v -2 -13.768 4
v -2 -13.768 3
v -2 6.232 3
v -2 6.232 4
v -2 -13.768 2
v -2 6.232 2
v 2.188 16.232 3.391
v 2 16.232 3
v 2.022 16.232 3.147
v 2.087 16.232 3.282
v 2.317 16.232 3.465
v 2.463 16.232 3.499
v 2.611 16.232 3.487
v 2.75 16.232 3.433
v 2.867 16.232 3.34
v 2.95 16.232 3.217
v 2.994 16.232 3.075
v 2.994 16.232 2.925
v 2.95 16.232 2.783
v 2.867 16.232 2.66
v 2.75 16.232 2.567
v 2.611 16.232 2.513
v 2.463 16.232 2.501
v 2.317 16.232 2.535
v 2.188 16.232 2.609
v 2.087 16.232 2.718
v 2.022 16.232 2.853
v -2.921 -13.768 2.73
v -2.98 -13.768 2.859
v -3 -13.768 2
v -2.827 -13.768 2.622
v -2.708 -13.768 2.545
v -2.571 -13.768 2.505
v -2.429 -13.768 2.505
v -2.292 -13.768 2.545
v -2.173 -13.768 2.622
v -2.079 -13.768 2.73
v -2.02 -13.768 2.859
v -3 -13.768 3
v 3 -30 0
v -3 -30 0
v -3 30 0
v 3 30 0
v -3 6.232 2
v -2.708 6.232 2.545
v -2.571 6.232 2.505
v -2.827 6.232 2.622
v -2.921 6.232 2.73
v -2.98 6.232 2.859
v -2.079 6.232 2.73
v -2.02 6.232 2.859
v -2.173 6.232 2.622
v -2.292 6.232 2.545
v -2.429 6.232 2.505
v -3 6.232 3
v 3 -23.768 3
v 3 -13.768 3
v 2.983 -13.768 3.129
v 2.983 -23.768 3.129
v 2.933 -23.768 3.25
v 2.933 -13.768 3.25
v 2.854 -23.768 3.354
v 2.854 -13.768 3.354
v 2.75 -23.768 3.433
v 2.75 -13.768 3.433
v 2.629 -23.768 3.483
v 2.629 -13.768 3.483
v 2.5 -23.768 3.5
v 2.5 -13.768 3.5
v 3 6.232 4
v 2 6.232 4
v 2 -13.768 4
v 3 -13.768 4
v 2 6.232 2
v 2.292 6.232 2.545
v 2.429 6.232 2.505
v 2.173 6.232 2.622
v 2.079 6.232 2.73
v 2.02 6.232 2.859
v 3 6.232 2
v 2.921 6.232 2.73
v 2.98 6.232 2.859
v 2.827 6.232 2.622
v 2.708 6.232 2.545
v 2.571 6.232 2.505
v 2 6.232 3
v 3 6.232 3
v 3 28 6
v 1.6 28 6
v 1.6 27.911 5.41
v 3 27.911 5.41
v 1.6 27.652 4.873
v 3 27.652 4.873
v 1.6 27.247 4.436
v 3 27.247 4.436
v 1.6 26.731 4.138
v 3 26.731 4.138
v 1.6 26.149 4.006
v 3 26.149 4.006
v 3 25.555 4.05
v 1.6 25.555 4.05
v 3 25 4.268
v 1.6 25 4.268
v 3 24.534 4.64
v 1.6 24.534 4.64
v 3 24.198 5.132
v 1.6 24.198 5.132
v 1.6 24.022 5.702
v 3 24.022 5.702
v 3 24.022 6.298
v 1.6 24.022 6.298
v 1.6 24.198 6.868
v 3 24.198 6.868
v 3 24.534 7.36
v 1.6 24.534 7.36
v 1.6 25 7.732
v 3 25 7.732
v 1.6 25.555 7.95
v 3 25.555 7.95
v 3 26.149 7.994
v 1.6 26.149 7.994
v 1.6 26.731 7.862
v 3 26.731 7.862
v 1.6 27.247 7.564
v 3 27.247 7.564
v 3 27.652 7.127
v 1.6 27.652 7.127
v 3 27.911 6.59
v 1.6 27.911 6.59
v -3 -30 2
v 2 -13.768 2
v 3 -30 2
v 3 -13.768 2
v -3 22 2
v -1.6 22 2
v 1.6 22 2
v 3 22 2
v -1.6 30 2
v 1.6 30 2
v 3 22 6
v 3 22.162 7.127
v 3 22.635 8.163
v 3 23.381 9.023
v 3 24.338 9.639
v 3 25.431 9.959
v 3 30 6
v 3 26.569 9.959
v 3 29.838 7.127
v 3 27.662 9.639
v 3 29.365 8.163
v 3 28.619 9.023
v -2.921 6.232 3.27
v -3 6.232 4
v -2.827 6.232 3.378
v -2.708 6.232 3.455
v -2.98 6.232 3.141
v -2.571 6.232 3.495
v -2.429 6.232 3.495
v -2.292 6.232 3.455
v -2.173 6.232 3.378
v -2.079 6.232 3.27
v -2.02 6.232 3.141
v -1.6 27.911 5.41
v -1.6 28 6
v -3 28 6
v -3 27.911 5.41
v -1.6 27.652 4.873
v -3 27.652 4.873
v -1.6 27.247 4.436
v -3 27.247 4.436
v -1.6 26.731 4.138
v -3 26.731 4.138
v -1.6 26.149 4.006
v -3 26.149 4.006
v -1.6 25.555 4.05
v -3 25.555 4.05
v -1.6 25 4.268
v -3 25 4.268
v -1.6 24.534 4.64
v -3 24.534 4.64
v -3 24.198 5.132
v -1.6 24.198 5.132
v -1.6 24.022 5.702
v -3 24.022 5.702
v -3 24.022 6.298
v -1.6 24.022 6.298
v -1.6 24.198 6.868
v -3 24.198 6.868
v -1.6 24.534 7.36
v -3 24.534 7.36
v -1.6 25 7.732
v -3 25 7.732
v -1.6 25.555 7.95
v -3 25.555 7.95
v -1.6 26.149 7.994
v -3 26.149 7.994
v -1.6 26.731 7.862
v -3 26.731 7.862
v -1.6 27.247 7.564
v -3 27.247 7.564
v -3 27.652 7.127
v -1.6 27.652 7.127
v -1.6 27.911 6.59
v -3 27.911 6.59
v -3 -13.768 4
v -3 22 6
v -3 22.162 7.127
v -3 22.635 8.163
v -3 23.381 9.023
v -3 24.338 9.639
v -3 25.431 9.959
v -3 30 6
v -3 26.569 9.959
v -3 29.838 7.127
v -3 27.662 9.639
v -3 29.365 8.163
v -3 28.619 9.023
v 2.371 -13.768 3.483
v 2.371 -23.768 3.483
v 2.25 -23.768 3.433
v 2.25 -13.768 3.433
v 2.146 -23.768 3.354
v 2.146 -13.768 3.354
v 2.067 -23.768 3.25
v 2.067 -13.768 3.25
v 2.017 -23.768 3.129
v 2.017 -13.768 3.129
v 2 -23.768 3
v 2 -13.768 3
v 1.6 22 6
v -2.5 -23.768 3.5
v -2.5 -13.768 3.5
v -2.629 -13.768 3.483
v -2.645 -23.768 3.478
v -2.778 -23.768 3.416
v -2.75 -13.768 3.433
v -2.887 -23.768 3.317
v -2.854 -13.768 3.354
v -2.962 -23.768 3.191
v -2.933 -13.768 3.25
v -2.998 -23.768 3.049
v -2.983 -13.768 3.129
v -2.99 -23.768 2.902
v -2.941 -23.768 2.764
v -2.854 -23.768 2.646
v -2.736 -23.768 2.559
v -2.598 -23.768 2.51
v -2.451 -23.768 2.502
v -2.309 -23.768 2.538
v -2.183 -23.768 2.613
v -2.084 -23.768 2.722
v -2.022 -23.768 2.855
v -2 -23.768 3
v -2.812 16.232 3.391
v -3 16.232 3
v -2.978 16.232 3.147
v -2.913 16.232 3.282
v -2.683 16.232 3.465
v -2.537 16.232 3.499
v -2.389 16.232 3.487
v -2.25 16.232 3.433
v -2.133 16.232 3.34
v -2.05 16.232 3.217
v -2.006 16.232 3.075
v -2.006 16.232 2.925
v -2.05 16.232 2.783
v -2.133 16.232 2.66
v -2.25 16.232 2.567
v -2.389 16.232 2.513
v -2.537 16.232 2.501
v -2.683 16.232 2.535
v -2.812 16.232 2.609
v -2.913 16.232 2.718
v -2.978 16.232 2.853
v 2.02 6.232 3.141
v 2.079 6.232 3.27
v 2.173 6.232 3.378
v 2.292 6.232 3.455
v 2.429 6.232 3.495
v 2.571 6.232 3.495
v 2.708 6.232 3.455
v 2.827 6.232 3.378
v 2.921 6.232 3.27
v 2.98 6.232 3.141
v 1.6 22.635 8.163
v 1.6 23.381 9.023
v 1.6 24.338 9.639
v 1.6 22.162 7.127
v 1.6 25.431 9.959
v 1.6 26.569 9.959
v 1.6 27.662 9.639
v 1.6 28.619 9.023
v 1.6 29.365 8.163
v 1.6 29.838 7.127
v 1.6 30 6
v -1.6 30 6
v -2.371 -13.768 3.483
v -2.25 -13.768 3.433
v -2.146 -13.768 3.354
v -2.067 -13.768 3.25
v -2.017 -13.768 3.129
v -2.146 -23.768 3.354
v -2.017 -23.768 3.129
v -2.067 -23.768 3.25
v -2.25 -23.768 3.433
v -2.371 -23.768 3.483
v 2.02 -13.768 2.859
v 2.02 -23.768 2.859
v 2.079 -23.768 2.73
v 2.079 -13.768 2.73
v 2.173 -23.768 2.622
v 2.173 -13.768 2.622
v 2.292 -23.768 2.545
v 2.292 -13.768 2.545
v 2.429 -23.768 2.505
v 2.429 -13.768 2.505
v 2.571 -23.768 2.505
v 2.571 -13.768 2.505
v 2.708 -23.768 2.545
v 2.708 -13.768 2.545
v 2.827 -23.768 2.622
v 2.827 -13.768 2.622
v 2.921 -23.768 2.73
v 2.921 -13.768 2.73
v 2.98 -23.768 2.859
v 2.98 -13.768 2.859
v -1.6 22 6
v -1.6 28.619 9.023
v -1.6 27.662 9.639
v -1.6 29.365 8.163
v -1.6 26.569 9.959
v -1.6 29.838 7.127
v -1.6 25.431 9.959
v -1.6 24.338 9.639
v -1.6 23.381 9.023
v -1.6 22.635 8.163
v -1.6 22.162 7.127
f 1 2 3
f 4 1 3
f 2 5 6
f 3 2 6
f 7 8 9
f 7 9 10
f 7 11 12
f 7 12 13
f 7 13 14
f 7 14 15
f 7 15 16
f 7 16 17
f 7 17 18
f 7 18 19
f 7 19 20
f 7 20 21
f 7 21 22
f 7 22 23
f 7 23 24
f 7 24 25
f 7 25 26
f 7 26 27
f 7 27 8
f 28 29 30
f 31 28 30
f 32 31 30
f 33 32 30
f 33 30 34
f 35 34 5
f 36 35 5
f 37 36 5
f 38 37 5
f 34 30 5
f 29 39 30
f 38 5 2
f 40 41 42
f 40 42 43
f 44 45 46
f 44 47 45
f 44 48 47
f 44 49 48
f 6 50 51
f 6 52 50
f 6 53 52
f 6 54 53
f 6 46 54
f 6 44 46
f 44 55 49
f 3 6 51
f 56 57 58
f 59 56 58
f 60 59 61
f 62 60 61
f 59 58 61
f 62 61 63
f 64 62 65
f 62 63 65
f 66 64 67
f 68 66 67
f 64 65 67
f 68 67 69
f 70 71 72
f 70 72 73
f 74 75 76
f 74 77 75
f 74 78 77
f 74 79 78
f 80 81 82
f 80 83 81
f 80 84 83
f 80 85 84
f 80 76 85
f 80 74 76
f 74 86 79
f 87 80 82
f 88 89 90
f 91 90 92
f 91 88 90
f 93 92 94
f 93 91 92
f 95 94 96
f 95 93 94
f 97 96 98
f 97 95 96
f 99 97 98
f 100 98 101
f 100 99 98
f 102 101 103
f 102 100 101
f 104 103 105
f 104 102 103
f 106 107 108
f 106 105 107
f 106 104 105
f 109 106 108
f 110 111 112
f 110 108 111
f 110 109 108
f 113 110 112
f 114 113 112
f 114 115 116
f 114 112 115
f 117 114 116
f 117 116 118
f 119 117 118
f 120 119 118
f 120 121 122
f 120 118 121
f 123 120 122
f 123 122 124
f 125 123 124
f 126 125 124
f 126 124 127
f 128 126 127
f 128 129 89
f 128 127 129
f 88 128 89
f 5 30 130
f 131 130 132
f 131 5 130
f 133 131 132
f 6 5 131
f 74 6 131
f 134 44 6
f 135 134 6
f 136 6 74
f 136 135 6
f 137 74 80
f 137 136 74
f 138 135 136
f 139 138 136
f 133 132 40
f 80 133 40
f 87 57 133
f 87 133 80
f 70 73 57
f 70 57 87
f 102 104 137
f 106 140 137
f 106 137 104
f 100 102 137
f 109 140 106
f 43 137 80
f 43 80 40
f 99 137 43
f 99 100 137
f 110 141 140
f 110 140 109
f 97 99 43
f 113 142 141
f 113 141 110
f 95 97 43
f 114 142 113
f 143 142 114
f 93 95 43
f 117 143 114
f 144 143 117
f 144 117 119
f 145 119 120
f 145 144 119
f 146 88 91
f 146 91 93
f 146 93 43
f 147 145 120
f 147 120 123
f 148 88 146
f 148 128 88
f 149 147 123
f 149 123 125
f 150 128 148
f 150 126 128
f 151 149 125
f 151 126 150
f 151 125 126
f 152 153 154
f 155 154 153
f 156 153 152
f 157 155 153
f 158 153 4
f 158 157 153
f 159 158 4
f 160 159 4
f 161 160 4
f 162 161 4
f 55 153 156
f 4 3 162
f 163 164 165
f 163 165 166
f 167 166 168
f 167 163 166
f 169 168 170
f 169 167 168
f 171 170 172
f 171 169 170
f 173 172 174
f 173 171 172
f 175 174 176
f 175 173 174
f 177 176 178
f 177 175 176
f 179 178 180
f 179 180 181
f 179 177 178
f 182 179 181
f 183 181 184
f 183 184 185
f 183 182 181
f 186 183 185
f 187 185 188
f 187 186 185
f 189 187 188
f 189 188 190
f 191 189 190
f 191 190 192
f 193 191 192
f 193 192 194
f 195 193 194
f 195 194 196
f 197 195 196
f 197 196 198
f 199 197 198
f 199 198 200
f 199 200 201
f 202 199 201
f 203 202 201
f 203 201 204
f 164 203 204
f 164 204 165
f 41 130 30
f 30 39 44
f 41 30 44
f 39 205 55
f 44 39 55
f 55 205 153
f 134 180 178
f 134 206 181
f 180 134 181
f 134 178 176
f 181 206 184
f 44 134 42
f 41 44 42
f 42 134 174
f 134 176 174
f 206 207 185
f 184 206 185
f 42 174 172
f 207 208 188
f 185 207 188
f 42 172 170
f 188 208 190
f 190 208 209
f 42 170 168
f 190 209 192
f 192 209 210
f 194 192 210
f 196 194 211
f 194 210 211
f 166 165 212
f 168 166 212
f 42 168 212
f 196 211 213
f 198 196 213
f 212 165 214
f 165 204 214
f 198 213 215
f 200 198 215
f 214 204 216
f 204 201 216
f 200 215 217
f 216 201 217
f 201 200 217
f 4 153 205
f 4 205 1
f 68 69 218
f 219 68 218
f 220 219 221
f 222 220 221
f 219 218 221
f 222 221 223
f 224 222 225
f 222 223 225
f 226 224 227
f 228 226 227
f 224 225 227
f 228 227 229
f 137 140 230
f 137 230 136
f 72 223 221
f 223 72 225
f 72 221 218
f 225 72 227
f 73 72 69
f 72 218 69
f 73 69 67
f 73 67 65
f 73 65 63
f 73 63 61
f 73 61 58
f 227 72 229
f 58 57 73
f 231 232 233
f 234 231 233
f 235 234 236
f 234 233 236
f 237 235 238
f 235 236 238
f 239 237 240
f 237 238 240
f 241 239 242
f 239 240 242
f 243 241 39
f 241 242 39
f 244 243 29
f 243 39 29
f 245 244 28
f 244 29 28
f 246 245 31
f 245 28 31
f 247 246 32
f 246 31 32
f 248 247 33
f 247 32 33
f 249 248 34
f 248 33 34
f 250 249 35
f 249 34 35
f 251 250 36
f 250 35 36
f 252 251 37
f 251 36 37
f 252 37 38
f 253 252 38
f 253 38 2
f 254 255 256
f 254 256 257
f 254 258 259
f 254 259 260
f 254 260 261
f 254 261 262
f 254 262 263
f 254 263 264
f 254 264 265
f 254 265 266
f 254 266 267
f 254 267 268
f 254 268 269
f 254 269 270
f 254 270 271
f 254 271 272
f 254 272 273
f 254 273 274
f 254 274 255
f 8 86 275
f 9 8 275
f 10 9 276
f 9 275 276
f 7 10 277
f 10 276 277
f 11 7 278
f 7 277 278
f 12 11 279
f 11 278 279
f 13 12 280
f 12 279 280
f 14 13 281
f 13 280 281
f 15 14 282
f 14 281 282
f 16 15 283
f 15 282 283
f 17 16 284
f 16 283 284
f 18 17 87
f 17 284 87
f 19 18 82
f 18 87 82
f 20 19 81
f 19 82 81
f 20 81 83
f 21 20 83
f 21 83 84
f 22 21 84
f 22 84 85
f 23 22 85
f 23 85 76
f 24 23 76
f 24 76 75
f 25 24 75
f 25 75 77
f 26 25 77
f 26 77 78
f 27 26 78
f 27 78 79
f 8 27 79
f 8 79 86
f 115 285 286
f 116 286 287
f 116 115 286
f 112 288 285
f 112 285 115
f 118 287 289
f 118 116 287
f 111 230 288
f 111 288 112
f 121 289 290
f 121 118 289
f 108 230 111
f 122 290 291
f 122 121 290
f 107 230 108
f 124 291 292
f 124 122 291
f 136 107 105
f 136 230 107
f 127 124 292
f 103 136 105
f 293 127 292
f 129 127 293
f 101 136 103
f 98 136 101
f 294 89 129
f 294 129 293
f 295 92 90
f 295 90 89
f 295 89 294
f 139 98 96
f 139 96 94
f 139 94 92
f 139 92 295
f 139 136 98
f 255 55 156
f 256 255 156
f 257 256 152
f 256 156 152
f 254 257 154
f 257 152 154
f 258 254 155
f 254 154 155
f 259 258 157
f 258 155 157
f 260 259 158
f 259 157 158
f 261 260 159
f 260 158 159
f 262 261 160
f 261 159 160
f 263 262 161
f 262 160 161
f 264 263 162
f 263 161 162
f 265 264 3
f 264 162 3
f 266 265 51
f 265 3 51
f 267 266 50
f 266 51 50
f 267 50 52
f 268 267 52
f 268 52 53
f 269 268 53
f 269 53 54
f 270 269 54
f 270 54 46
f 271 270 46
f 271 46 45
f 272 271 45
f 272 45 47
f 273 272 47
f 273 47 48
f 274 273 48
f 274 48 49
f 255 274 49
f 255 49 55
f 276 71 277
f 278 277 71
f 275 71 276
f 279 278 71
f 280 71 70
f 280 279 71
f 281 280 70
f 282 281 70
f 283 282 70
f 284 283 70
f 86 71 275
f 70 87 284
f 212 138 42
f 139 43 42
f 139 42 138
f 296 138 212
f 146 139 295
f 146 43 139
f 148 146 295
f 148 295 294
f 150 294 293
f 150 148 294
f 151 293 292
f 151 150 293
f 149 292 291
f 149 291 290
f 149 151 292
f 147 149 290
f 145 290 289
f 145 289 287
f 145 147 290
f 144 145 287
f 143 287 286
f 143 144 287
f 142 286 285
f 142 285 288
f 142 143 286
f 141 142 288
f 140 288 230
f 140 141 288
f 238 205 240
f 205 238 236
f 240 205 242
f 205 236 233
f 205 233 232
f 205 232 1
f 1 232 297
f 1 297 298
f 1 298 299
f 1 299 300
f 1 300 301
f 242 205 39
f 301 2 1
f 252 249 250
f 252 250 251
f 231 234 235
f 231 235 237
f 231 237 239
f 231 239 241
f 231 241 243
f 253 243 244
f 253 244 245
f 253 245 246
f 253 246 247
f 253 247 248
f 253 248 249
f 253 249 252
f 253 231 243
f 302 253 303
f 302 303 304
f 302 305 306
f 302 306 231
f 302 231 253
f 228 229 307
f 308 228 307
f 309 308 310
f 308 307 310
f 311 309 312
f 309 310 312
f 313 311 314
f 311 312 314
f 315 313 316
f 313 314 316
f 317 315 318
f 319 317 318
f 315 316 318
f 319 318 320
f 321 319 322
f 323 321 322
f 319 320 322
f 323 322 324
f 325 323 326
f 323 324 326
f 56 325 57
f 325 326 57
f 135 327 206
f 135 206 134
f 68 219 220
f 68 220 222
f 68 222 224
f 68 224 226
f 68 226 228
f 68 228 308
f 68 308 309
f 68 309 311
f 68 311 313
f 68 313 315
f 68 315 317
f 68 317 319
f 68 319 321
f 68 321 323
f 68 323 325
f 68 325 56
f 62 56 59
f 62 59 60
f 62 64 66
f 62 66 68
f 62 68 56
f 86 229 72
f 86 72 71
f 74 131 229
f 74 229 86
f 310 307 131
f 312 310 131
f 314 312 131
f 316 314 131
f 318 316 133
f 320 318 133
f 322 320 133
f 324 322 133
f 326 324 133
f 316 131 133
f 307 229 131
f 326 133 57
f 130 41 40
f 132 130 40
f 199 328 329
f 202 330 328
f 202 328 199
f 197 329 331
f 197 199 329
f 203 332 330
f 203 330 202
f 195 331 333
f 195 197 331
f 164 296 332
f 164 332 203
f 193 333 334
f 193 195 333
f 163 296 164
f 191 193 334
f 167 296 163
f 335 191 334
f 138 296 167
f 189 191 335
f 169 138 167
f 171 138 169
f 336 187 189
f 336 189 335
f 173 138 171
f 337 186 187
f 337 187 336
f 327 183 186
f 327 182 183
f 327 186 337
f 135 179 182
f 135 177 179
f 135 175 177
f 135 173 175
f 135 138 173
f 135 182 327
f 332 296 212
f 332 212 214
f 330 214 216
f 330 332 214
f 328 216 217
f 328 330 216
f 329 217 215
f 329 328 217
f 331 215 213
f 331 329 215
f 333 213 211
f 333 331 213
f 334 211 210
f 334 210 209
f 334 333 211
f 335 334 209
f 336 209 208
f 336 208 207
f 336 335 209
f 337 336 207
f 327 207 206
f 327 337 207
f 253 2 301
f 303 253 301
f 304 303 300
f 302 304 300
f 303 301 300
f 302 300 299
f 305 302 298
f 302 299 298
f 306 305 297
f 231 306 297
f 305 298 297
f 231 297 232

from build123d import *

# Parameters (mm, degrees)
F0_W      = 6
F0_H      = 60
F1_DEPTH  = 2
F3_DEPTH  = 6
F6_DEPTH  = 25
F4_W      = 1
F4_H      = 20
F7_DEPTH  = 2
F9_DEPTH  = 10
F10_R     = 0.5
F11_DEPTH = 10


# Not quite as in the source:
# - a feature of the source that left no trace in its solid (it failed there, or was rolled back) is left out
# - the program builds the solid bodies; features that only make, move or delete a surface that nothing else refers to are left out


with BuildPart() as f1:
    # F0 (on Top) → F1 (new body)
    with BuildSketch(Plane.XY):
        Rectangle(F0_W, F0_H)
    extrude(amount=F1_DEPTH)

    # F2 (on face) → F3 (join)
    with BuildSketch(Plane.YZ.offset(3)):
        with BuildLine():
            Line((28, 6), (30, 6))
            ThreePointArc((30, 6), (26, 10), (22, 6))
            Line((22, 6), (24, 6))
            ThreePointArc((24, 6), (26, 8), (28, 6))
        make_face()
        with BuildLine():
            Line((22, 2), (30, 2))
            Line((30, 2), (30, 6))
            Line((30, 6), (28, 6))
            ThreePointArc((28, 6), (26, 4), (24, 6))
            Line((24, 6), (22, 6))
            Line((22, 6), (22, 2))
        make_face()
    extrude(amount=-F3_DEPTH)

    # F5 (on face) → F6 (cut)
    with BuildSketch(Plane.XY.offset(2)):
        Polygon((1.6, 22), (1.6, 30), (0, 30), (-1.6, 30), (-1.6, 22), align=None)
    extrude(amount=F6_DEPTH, mode=Mode.SUBTRACT)

    # F4 (on face) → F7 (join)
    with BuildSketch(Plane.XY.offset(2)):
        with Locations((2.5, -3.7680014595)):
            Rectangle(F4_W, F4_H)
        with Locations((-2.5, -3.7680014595)):
            Rectangle(F4_W, F4_H)
    extrude(amount=F7_DEPTH)

    # F8 (on face) → F9 (join)
    with BuildSketch(Plane.XZ.offset(13.7680014595)):
        with BuildLine():
            ThreePointArc((2.5, 3.5), (2.1464466094, 3.3535533906), (2, 3))
            ThreePointArc((2, 3), (2.5, 2.5), (3, 3))
            ThreePointArc((3, 3), (2.8535533906, 3.3535533906), (2.5, 3.5))
        make_face()
        with BuildLine():
            ThreePointArc((-2.5, 3.5), (-2.8535533906, 2.6464466094), (-2, 3))
            ThreePointArc((-2, 3), (-2.1464466094, 3.3535533906), (-2.5, 3.5))
        make_face()
    extrude(amount=F9_DEPTH)

    # F10 (on face) → F11 (join)
    with BuildSketch(Plane(origin=(0, 6.2319985405, 0), x_dir=(-1, 0, 0), z_dir=(0, 1, 0))):
        with Locations((-2.5, 3)):
            Circle(F10_R)
        with Locations((2.5, 3)):
            Circle(F10_R)
    extrude(amount=F11_DEPTH)


solid = f1.part
